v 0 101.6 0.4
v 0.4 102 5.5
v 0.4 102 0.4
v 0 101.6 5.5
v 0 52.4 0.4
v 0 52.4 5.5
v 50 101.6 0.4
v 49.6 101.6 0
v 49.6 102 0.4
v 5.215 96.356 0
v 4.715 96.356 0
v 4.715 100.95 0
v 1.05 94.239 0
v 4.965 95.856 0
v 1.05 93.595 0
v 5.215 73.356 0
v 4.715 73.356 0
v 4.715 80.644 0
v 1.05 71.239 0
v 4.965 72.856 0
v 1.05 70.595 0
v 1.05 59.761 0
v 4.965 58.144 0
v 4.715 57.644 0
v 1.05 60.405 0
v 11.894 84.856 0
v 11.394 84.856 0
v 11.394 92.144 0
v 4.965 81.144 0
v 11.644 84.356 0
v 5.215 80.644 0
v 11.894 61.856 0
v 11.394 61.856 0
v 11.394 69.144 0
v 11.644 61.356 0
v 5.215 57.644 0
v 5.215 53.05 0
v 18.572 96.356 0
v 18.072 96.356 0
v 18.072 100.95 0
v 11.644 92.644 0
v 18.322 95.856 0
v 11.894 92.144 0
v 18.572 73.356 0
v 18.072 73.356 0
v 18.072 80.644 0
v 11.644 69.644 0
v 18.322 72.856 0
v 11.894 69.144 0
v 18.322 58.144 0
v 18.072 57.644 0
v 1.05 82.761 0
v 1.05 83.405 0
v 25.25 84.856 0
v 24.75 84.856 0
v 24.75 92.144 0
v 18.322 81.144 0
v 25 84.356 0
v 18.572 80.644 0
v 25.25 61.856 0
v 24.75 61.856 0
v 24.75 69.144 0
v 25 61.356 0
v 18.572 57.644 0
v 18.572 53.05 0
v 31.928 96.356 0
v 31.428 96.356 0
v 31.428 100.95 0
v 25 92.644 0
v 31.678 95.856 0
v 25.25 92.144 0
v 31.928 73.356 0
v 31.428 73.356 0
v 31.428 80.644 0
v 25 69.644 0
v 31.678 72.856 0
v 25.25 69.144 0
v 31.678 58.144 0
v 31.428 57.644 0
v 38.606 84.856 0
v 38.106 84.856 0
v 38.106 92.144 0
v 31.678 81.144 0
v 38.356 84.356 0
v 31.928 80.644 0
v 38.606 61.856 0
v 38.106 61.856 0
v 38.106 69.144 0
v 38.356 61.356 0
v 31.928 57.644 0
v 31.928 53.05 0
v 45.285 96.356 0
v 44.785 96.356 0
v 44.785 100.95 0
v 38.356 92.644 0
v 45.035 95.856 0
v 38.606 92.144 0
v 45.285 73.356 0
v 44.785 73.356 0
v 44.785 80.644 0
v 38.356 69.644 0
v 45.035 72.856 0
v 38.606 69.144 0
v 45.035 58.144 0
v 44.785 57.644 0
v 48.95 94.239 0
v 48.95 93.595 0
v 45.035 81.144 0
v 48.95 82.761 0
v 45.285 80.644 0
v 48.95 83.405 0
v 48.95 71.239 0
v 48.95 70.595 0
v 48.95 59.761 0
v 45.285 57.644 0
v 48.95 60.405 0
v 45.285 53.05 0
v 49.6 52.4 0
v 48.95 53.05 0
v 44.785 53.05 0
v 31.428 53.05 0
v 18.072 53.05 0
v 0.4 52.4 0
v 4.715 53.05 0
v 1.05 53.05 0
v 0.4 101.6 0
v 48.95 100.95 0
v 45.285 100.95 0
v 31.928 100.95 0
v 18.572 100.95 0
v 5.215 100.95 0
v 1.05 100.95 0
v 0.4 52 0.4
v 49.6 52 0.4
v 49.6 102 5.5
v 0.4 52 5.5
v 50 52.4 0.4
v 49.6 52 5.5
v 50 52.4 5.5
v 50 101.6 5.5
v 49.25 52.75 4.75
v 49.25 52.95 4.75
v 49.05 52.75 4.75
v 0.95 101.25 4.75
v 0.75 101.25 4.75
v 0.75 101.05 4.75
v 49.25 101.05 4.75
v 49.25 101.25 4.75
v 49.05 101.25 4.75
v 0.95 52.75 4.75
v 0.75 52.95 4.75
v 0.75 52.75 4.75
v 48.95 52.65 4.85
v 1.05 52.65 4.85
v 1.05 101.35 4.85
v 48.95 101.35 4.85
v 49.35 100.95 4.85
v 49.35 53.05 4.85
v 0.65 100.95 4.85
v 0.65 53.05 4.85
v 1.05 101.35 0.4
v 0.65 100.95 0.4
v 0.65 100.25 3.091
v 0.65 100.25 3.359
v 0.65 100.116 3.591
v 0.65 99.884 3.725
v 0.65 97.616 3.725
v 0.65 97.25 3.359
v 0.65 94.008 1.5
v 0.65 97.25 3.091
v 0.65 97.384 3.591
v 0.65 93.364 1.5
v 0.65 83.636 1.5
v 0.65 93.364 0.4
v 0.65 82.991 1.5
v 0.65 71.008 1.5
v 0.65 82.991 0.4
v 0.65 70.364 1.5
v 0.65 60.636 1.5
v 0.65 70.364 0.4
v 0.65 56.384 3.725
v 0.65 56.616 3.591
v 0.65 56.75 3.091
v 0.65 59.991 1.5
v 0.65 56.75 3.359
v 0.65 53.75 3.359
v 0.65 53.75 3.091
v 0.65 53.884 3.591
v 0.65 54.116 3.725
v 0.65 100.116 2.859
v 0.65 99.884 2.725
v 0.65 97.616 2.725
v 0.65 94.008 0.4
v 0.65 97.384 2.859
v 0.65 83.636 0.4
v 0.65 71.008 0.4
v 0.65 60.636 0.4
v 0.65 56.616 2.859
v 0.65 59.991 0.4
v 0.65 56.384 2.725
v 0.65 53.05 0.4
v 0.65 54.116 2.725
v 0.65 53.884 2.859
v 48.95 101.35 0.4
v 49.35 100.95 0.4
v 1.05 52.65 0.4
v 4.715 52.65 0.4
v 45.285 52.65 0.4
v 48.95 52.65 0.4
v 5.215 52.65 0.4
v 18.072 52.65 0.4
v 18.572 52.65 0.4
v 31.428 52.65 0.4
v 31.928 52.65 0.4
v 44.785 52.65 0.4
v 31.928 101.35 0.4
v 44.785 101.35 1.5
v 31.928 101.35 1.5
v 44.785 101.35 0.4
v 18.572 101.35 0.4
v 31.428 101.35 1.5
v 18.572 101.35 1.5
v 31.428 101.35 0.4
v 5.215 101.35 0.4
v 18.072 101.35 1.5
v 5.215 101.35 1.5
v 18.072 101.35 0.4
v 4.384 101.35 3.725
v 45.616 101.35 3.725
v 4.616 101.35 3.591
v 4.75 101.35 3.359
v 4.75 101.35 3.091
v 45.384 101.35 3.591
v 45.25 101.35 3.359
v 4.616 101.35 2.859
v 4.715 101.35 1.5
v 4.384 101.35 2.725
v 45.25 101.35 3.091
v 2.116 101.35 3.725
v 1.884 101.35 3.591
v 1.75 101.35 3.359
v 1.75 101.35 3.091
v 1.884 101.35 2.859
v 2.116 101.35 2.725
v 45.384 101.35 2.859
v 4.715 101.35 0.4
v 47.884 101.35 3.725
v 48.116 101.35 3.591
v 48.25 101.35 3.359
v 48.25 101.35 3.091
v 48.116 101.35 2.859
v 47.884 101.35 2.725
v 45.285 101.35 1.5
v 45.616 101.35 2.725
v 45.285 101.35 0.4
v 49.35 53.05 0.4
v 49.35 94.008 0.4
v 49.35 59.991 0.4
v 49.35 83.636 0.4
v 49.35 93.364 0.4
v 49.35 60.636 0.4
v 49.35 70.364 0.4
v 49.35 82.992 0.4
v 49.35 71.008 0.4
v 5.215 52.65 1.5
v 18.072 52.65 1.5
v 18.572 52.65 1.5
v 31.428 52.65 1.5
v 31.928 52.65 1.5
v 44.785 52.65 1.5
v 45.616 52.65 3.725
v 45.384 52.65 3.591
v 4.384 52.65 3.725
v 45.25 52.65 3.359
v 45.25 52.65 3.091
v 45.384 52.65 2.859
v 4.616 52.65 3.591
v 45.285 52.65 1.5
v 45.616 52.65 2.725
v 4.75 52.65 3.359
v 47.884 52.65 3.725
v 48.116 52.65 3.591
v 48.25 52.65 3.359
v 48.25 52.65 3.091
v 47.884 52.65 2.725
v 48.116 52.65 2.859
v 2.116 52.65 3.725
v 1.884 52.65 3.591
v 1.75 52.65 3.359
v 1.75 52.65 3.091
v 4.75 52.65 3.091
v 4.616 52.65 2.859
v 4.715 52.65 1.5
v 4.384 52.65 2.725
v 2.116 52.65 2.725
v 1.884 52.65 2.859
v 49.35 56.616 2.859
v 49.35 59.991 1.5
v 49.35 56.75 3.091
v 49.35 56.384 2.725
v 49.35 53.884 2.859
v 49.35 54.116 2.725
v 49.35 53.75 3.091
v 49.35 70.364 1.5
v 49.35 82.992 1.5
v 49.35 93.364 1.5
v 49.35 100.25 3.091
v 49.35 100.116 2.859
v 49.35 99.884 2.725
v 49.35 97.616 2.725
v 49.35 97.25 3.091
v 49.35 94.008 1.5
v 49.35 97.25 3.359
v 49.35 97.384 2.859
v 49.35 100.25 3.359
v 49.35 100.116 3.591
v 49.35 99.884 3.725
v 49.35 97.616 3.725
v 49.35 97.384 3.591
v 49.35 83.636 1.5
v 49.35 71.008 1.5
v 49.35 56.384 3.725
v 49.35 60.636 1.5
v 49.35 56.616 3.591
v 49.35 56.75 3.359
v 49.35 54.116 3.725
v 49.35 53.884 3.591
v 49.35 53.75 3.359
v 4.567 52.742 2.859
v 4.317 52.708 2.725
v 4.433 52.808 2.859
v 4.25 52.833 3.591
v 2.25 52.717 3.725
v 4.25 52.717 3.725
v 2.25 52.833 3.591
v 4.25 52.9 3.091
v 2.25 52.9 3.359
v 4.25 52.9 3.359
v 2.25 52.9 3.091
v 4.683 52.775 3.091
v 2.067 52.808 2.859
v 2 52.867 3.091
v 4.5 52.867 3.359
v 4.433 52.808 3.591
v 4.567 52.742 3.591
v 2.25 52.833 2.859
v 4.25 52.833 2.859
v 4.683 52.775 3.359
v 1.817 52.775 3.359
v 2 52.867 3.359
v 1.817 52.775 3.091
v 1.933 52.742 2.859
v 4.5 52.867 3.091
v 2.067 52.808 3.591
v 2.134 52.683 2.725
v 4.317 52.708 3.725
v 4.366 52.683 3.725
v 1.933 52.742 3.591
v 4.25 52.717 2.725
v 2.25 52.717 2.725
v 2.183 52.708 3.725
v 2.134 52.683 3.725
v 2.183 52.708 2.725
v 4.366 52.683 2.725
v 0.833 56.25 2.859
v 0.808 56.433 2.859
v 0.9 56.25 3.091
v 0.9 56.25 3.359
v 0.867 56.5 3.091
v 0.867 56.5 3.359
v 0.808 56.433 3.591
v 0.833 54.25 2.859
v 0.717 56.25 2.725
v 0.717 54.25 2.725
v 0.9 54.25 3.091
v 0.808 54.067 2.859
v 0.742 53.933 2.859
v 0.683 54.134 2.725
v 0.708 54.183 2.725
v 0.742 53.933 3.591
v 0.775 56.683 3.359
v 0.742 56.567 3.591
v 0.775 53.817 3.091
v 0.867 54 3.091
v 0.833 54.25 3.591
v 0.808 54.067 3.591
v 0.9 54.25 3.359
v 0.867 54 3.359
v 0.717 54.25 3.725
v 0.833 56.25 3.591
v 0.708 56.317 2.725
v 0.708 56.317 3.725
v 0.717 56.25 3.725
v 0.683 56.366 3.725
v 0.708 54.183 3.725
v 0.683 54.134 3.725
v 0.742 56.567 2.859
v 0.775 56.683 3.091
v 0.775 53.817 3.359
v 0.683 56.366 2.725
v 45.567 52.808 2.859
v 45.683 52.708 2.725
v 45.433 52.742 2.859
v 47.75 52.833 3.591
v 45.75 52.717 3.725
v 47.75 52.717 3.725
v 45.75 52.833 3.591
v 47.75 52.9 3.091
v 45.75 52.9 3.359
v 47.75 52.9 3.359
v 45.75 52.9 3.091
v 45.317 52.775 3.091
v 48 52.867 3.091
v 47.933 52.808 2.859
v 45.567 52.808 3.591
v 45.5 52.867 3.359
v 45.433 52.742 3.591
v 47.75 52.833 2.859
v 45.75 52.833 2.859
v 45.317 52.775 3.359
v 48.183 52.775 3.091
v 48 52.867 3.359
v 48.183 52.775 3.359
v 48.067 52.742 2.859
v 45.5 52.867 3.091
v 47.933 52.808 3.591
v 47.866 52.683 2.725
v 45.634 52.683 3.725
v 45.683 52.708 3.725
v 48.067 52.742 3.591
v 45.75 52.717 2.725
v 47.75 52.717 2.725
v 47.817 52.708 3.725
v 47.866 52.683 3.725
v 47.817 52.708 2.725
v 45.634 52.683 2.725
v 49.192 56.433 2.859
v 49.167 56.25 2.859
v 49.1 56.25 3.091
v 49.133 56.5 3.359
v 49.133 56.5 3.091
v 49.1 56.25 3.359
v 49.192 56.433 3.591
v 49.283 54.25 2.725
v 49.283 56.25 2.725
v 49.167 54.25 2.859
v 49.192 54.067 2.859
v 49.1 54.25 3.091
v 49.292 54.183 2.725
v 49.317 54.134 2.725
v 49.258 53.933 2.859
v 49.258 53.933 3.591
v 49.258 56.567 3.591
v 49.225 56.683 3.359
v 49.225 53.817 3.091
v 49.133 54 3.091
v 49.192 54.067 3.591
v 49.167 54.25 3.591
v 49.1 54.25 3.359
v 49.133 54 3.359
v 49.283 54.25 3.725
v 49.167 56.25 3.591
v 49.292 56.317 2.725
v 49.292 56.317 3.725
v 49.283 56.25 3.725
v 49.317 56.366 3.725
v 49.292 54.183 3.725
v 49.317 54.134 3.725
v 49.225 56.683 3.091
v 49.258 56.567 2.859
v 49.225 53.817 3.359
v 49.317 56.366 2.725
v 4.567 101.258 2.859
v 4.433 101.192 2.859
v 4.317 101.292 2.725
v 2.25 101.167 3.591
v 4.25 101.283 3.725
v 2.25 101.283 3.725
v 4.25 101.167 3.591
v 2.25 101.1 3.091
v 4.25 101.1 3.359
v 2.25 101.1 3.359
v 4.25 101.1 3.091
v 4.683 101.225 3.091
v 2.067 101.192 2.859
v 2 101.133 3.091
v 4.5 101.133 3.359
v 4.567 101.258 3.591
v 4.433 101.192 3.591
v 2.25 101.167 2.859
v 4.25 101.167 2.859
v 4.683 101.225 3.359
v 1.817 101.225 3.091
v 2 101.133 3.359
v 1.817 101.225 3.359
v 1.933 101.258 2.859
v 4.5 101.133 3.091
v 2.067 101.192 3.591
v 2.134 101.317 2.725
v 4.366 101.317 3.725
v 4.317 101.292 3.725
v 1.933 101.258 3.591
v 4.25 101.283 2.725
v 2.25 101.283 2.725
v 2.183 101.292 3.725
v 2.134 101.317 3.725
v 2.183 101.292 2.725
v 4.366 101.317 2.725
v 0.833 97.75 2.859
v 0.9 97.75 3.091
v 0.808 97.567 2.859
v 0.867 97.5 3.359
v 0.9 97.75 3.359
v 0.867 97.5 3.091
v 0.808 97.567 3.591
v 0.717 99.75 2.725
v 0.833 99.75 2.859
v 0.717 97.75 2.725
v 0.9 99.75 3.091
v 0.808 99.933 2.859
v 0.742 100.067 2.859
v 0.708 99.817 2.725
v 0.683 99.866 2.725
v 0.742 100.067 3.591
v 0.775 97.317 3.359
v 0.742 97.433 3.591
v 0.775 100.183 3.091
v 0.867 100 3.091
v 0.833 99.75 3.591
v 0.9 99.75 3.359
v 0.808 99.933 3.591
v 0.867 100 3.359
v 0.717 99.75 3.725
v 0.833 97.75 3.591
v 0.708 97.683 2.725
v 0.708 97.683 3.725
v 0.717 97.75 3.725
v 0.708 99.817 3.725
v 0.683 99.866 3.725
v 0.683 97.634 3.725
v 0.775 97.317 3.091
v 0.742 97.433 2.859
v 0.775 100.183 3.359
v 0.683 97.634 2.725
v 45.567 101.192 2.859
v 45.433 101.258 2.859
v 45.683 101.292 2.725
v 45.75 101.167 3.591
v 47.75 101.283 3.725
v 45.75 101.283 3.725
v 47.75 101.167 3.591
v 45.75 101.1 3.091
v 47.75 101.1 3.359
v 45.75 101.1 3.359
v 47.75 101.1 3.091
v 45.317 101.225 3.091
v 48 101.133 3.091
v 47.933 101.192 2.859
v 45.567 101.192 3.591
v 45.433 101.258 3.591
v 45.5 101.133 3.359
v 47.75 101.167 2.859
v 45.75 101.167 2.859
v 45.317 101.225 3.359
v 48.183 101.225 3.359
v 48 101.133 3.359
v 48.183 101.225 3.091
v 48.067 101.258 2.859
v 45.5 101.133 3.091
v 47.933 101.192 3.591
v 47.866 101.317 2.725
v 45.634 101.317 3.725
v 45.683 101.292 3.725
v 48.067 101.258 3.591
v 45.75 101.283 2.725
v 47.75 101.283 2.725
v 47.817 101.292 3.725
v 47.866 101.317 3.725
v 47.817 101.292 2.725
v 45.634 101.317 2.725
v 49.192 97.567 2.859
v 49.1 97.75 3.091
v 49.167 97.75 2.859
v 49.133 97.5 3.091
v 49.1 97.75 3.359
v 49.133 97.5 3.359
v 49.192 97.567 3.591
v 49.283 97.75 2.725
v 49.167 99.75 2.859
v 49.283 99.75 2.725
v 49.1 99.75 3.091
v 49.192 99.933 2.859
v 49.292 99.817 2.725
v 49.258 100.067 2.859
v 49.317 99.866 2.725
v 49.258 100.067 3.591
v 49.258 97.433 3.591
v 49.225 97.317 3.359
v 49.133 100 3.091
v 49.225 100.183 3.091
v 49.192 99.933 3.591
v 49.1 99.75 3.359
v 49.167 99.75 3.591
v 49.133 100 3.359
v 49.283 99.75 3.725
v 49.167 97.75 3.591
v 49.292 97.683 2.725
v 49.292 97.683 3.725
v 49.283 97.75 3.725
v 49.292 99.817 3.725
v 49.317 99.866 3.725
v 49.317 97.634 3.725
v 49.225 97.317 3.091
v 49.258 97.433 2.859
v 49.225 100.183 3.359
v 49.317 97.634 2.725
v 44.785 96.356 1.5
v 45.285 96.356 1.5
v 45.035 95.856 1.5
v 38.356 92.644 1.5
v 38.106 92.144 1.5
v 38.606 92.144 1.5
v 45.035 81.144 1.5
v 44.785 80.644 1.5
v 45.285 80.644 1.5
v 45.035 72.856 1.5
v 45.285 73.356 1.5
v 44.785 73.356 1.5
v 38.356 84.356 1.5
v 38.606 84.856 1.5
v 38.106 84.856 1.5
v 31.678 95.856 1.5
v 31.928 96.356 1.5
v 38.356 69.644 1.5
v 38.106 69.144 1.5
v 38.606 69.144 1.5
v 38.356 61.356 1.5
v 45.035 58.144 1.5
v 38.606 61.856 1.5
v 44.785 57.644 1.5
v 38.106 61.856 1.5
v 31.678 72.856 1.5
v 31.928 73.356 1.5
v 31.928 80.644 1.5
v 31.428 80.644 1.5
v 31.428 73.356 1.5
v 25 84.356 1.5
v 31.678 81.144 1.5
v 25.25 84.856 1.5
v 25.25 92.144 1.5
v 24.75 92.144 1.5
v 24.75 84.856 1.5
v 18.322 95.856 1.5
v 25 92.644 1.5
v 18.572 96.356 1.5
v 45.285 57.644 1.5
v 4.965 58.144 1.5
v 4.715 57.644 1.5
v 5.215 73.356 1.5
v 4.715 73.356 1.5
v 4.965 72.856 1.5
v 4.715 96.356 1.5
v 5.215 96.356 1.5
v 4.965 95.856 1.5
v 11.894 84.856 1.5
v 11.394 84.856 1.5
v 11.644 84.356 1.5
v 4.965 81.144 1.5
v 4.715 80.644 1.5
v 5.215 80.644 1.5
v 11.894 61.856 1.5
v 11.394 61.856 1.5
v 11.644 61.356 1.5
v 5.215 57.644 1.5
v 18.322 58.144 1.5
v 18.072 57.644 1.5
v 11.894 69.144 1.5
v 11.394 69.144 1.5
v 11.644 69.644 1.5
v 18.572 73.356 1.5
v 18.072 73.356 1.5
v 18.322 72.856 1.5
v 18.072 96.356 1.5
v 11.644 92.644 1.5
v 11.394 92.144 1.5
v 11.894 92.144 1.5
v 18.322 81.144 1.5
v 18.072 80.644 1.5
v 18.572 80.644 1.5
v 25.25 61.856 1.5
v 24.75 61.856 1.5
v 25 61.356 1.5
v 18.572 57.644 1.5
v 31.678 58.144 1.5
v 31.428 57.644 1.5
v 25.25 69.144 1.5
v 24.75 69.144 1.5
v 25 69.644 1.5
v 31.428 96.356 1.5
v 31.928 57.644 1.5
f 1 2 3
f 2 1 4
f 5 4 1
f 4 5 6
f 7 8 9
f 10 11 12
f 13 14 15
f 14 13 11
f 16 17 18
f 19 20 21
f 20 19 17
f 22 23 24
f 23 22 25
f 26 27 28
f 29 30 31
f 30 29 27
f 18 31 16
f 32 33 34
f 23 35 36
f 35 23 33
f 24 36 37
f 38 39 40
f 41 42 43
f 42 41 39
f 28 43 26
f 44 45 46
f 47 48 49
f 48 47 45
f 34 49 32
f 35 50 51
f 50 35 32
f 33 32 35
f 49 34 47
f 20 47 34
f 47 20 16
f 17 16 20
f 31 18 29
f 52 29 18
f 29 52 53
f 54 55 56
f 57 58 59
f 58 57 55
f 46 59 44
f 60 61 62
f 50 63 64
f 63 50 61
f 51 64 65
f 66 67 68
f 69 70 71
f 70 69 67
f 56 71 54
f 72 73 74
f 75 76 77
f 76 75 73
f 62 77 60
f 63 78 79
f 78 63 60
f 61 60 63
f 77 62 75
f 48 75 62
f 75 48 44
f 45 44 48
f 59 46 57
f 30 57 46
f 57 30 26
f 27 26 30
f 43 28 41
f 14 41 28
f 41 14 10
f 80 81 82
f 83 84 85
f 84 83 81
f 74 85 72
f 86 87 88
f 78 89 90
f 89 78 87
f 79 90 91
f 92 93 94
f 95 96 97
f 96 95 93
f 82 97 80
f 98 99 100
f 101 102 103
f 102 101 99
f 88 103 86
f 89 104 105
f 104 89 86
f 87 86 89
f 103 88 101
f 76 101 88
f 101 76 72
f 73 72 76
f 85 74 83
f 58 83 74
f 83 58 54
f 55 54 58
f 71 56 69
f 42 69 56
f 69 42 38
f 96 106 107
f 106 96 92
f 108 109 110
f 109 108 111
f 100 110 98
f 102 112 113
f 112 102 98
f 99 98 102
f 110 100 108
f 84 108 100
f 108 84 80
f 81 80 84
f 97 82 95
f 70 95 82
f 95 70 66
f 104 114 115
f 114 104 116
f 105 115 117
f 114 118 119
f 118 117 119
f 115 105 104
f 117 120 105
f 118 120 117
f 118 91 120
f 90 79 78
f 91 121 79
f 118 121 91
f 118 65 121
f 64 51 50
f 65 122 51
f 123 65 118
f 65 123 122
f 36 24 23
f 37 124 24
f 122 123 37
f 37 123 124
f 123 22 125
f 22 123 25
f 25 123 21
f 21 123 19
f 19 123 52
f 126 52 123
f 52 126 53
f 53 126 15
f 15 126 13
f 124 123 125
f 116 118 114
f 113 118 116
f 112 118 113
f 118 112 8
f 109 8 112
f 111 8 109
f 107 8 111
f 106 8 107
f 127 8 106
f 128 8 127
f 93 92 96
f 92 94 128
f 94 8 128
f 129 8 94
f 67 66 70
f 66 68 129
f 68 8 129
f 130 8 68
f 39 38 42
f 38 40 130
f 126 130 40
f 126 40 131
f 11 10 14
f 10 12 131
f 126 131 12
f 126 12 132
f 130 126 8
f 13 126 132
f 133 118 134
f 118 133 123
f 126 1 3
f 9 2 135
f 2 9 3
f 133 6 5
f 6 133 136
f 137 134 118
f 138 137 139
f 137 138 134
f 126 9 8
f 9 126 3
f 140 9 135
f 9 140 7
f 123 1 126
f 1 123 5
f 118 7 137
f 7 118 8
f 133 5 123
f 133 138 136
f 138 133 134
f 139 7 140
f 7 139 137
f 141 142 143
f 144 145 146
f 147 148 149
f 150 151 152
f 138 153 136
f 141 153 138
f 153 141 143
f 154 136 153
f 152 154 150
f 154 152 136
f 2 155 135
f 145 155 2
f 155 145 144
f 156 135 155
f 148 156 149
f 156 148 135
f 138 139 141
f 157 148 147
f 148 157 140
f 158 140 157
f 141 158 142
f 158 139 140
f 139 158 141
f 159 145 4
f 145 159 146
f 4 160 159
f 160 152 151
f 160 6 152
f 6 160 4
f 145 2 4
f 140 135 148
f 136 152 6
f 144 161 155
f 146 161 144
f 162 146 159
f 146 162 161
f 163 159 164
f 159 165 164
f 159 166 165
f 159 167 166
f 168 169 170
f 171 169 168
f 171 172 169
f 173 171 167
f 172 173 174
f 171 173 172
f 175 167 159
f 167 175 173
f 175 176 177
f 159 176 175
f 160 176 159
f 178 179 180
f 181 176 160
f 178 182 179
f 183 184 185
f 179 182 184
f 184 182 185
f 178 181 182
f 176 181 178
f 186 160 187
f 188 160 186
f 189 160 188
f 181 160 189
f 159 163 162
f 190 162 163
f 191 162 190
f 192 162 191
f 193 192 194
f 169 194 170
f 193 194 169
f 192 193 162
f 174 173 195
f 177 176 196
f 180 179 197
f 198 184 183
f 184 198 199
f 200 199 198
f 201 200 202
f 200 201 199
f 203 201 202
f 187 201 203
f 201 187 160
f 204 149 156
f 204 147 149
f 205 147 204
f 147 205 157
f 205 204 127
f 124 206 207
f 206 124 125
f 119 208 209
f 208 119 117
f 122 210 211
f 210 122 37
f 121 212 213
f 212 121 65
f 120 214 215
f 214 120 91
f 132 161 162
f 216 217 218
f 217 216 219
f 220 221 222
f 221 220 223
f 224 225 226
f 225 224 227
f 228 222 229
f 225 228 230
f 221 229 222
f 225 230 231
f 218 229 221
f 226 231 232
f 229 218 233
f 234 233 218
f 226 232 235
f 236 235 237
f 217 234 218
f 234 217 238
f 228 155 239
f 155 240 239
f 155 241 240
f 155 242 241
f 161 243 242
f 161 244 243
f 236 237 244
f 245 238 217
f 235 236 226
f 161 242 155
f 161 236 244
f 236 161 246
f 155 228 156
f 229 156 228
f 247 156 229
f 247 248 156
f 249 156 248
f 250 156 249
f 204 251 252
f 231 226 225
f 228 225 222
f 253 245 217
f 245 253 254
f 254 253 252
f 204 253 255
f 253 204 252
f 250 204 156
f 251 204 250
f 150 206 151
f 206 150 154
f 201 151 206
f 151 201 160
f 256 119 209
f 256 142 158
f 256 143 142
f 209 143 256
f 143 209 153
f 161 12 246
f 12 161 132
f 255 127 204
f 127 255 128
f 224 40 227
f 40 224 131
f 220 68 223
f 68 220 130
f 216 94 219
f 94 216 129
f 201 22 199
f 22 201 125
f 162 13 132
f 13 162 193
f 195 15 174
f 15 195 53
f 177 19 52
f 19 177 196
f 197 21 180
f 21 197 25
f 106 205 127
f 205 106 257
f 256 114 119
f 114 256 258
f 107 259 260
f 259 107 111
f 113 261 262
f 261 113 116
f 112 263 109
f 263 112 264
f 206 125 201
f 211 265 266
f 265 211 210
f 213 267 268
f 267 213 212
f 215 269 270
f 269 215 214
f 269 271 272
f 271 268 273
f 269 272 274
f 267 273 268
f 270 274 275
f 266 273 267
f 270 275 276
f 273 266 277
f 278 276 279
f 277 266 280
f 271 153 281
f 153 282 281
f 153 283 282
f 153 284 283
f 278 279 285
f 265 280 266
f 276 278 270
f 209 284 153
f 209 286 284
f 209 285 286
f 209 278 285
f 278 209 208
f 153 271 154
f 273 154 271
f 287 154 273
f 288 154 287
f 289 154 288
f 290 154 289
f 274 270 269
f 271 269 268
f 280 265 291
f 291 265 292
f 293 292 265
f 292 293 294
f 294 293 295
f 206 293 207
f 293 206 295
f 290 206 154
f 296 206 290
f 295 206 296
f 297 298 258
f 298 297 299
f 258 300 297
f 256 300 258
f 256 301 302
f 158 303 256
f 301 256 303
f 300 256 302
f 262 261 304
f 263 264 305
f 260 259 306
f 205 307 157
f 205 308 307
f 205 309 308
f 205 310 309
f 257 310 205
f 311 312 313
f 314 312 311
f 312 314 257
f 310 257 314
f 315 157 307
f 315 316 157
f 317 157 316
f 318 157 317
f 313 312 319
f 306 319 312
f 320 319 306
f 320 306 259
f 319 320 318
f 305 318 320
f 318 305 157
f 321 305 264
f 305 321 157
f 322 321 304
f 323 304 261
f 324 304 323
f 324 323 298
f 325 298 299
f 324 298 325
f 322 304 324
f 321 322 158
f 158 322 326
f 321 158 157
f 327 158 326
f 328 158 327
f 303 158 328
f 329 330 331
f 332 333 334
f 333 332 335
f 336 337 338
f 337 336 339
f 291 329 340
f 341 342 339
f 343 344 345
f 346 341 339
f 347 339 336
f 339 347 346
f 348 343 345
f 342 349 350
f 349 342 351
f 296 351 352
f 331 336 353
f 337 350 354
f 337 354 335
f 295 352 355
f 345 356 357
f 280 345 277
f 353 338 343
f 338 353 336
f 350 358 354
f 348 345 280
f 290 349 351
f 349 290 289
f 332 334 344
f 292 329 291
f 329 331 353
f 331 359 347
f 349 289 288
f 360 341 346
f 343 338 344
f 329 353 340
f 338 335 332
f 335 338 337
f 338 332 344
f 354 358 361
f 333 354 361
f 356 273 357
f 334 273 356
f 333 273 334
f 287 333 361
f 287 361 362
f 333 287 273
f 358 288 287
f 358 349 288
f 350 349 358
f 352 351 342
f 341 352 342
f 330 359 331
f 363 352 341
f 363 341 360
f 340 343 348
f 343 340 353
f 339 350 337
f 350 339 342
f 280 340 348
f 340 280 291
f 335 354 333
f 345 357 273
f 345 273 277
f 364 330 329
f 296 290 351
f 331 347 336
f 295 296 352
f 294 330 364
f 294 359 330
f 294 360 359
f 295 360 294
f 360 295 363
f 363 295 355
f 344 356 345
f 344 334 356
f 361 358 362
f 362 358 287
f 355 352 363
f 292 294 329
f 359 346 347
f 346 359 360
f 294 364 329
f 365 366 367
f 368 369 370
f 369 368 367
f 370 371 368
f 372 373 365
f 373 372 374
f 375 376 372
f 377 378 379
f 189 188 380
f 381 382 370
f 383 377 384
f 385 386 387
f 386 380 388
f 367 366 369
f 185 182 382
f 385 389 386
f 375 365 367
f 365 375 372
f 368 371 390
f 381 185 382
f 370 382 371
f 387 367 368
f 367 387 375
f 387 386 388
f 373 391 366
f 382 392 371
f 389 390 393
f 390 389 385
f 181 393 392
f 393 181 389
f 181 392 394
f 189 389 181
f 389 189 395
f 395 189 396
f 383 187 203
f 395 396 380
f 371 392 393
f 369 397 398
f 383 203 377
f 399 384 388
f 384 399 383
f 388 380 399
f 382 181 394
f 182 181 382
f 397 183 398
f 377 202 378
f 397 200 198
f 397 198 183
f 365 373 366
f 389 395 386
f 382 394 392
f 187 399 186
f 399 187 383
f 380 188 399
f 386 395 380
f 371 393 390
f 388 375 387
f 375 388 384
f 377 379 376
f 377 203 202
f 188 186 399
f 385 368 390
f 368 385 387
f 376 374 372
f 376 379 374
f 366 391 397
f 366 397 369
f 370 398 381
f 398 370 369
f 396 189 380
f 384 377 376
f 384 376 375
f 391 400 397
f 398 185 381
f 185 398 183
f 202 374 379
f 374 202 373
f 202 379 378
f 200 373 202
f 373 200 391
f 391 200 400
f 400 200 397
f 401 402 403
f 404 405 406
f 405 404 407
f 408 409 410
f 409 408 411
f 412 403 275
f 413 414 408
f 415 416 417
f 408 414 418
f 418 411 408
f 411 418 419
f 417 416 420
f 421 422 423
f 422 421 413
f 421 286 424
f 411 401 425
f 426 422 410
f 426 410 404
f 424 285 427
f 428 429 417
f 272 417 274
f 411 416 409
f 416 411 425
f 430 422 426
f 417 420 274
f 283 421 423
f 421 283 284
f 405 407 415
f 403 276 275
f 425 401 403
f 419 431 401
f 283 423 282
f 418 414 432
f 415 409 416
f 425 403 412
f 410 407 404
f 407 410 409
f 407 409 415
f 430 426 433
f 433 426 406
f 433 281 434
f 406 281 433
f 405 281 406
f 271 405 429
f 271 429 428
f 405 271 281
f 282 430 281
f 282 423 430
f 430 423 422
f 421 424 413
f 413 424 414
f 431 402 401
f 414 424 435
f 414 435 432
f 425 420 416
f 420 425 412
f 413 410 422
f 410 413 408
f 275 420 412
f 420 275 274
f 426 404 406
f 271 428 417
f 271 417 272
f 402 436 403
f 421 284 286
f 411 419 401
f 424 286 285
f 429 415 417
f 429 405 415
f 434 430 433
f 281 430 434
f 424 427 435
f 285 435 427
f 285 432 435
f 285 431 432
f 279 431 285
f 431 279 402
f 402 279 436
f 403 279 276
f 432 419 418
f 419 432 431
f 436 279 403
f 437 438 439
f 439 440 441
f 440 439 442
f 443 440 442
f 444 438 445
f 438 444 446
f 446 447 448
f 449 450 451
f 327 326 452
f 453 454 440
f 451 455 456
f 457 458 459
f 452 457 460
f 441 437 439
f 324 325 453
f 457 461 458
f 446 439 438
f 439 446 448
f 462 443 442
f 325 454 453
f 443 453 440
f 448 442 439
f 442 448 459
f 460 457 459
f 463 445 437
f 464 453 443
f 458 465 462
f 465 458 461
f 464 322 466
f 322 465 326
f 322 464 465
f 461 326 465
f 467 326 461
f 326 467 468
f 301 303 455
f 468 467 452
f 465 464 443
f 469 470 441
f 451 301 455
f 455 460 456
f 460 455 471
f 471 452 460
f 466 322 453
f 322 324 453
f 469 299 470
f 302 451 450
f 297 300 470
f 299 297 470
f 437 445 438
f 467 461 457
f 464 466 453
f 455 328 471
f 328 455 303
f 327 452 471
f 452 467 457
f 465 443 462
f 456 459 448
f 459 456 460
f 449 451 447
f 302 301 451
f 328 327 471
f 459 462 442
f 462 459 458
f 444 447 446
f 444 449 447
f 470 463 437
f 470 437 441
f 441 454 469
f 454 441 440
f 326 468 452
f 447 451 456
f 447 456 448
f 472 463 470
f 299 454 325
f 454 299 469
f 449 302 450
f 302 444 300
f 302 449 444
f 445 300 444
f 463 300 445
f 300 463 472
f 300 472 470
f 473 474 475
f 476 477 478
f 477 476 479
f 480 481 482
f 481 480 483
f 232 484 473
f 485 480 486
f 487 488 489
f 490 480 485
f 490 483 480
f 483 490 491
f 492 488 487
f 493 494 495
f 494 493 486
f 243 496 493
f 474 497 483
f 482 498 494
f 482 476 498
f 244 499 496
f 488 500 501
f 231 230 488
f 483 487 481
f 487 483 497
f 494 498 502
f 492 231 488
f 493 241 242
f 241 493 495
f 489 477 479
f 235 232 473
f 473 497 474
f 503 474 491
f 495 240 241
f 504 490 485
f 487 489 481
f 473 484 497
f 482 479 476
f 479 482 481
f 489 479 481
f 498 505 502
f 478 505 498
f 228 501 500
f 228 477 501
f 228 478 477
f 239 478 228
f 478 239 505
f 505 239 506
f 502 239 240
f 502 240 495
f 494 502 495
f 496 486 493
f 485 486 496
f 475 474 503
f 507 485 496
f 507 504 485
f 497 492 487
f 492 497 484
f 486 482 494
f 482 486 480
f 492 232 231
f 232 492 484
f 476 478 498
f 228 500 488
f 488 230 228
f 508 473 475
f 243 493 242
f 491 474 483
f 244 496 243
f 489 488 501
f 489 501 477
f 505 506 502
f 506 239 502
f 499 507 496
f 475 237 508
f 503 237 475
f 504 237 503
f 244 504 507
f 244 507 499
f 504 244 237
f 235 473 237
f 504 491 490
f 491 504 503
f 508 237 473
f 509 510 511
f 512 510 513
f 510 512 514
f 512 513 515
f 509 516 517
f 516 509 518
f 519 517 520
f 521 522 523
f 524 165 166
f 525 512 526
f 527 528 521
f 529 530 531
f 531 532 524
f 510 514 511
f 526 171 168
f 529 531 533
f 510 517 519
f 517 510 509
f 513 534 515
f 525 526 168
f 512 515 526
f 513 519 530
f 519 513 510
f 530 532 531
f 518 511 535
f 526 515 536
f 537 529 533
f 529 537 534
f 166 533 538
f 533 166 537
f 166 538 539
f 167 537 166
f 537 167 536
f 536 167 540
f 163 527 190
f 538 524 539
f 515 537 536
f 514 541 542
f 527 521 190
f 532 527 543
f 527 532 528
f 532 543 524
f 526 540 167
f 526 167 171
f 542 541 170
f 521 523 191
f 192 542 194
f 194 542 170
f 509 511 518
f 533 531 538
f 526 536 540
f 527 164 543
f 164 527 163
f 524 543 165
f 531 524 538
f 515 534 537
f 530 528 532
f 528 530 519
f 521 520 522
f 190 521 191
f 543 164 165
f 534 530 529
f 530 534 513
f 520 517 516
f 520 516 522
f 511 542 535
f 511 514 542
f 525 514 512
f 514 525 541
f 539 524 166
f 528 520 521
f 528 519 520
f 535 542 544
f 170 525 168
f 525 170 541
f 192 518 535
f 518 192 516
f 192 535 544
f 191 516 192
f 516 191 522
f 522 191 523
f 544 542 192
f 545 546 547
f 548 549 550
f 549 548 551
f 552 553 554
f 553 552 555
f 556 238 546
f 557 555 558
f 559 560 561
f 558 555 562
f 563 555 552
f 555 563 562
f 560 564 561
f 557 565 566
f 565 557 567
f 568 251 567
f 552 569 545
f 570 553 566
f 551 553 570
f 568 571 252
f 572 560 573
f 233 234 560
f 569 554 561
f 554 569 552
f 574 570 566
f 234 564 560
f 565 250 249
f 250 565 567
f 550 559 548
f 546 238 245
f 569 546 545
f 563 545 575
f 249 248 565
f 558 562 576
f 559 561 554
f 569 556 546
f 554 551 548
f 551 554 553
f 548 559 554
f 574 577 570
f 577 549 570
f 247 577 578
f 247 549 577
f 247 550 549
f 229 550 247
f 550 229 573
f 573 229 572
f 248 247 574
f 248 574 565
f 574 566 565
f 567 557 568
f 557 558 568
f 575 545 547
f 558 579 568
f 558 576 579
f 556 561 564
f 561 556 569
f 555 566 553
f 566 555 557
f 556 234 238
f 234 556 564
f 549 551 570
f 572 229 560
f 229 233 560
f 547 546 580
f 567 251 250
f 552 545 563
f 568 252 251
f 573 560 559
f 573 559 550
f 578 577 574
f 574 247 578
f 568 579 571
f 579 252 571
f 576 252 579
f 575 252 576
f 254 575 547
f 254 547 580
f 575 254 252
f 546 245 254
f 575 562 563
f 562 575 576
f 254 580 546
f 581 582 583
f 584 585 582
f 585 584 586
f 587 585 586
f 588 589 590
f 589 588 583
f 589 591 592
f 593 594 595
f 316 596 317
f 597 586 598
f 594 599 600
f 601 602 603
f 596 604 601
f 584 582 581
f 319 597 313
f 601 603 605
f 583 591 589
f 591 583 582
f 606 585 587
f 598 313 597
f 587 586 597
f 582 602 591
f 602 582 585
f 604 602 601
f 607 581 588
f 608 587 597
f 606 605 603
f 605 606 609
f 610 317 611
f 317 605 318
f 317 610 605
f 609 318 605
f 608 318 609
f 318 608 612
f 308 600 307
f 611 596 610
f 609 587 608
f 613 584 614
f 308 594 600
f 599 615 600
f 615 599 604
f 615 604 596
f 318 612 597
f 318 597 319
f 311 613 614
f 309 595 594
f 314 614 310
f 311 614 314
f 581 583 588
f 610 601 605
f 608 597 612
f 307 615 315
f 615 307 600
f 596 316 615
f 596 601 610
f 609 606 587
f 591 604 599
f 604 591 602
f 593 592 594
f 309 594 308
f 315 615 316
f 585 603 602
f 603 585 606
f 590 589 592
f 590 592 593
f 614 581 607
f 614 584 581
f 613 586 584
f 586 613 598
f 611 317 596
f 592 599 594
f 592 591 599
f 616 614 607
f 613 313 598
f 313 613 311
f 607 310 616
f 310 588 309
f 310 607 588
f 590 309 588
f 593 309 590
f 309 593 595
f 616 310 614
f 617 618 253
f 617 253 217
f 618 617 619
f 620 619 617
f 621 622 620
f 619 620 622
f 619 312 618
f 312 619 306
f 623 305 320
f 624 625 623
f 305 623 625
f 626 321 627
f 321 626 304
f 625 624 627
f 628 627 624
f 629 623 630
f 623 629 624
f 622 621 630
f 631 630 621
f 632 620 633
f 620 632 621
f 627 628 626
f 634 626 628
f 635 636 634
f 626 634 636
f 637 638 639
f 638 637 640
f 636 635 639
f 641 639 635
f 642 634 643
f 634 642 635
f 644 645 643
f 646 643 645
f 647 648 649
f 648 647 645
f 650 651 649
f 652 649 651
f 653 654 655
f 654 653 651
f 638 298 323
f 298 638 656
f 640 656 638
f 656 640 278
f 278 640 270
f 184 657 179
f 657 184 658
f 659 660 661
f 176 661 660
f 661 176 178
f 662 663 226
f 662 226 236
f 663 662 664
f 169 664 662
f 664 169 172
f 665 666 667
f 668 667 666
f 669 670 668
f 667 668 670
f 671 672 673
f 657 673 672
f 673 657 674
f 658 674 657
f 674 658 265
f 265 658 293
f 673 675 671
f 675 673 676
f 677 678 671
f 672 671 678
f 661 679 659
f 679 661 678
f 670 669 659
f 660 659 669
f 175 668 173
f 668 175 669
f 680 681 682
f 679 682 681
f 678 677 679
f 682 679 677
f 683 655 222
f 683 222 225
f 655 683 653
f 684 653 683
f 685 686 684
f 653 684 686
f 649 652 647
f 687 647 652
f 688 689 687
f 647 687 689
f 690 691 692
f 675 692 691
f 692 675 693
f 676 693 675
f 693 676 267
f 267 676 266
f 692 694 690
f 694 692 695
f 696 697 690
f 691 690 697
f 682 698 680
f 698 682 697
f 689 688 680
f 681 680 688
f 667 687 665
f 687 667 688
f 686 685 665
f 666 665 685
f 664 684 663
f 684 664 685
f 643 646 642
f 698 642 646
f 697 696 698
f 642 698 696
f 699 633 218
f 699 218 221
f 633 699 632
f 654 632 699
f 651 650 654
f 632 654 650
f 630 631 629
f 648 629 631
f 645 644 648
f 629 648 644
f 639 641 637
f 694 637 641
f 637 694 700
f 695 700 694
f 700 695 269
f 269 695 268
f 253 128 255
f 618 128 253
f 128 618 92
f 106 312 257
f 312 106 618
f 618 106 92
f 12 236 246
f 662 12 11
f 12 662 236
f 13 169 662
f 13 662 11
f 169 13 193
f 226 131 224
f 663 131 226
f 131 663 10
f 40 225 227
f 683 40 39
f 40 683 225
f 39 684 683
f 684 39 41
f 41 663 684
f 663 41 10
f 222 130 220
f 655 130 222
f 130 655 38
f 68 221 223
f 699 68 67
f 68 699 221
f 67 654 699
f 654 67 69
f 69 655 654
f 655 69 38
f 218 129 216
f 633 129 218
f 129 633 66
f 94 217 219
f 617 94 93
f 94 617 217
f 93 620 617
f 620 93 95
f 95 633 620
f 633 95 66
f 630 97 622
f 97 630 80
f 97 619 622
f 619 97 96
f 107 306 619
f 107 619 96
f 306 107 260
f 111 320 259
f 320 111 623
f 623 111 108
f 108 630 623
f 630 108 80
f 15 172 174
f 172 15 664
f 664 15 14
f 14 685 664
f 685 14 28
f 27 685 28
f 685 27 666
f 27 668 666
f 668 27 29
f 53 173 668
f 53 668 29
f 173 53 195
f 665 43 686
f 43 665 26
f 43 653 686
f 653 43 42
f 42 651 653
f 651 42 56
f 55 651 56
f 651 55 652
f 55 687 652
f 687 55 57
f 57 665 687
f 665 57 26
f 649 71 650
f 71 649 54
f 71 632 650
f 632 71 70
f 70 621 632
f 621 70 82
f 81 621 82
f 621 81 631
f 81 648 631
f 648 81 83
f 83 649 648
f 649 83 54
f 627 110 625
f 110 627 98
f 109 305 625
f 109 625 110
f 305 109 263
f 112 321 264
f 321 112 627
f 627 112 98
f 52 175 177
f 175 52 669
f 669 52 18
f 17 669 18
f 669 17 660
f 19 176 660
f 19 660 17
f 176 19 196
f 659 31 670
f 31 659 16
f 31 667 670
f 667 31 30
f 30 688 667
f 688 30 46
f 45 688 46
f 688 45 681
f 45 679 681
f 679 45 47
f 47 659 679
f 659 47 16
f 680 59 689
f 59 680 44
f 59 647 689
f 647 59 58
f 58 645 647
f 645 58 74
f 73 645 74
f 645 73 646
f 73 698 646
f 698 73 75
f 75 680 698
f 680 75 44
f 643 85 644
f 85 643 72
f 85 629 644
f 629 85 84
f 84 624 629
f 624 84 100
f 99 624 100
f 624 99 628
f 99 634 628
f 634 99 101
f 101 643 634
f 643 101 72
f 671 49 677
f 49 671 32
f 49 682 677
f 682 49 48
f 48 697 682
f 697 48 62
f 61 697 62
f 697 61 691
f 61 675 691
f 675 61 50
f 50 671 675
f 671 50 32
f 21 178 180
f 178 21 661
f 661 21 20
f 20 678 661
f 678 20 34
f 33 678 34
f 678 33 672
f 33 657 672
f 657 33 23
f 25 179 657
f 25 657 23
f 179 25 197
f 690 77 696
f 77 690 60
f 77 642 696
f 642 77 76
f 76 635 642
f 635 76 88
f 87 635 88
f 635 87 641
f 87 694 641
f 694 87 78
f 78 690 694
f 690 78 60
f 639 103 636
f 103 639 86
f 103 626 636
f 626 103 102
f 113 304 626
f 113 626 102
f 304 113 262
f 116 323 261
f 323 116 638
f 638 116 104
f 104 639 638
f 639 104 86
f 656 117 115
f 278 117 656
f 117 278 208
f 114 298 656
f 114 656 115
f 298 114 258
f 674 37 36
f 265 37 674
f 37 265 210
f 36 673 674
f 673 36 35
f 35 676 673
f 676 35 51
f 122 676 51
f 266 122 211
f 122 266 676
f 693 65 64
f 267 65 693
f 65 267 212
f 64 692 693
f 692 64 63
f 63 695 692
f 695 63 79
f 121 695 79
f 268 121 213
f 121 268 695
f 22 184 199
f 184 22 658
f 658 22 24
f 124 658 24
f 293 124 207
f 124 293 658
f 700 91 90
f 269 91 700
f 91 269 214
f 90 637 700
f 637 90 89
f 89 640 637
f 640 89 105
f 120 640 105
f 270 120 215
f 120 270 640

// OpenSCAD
// Test: g_print_lid_b=true, g_print_box_b=false — should only render the lid
include <../../../release/lib/boardgame_insert_toolkit_lib.4.scad>;

data = [
    [ G_PRINT_LID_B, true ],
    [ G_PRINT_BOX_B, false ],
    [ G_ISOLATED_PRINT_BOX, "" ],
    [ OBJECT_BOX,
        [ NAME, "lid only" ],
        [ BOX_SIZE_XYZ, [50, 50, 20] ],
        [ BOX_LID,
            [ LID_PATTERN_RADIUS, 8 ],
        ],
        [ BOX_FEATURE,
            [ FTR_COMPARTMENT_SIZE_XYZ, [46, 46, 18] ],
        ],
    ],
];
Make(data);
